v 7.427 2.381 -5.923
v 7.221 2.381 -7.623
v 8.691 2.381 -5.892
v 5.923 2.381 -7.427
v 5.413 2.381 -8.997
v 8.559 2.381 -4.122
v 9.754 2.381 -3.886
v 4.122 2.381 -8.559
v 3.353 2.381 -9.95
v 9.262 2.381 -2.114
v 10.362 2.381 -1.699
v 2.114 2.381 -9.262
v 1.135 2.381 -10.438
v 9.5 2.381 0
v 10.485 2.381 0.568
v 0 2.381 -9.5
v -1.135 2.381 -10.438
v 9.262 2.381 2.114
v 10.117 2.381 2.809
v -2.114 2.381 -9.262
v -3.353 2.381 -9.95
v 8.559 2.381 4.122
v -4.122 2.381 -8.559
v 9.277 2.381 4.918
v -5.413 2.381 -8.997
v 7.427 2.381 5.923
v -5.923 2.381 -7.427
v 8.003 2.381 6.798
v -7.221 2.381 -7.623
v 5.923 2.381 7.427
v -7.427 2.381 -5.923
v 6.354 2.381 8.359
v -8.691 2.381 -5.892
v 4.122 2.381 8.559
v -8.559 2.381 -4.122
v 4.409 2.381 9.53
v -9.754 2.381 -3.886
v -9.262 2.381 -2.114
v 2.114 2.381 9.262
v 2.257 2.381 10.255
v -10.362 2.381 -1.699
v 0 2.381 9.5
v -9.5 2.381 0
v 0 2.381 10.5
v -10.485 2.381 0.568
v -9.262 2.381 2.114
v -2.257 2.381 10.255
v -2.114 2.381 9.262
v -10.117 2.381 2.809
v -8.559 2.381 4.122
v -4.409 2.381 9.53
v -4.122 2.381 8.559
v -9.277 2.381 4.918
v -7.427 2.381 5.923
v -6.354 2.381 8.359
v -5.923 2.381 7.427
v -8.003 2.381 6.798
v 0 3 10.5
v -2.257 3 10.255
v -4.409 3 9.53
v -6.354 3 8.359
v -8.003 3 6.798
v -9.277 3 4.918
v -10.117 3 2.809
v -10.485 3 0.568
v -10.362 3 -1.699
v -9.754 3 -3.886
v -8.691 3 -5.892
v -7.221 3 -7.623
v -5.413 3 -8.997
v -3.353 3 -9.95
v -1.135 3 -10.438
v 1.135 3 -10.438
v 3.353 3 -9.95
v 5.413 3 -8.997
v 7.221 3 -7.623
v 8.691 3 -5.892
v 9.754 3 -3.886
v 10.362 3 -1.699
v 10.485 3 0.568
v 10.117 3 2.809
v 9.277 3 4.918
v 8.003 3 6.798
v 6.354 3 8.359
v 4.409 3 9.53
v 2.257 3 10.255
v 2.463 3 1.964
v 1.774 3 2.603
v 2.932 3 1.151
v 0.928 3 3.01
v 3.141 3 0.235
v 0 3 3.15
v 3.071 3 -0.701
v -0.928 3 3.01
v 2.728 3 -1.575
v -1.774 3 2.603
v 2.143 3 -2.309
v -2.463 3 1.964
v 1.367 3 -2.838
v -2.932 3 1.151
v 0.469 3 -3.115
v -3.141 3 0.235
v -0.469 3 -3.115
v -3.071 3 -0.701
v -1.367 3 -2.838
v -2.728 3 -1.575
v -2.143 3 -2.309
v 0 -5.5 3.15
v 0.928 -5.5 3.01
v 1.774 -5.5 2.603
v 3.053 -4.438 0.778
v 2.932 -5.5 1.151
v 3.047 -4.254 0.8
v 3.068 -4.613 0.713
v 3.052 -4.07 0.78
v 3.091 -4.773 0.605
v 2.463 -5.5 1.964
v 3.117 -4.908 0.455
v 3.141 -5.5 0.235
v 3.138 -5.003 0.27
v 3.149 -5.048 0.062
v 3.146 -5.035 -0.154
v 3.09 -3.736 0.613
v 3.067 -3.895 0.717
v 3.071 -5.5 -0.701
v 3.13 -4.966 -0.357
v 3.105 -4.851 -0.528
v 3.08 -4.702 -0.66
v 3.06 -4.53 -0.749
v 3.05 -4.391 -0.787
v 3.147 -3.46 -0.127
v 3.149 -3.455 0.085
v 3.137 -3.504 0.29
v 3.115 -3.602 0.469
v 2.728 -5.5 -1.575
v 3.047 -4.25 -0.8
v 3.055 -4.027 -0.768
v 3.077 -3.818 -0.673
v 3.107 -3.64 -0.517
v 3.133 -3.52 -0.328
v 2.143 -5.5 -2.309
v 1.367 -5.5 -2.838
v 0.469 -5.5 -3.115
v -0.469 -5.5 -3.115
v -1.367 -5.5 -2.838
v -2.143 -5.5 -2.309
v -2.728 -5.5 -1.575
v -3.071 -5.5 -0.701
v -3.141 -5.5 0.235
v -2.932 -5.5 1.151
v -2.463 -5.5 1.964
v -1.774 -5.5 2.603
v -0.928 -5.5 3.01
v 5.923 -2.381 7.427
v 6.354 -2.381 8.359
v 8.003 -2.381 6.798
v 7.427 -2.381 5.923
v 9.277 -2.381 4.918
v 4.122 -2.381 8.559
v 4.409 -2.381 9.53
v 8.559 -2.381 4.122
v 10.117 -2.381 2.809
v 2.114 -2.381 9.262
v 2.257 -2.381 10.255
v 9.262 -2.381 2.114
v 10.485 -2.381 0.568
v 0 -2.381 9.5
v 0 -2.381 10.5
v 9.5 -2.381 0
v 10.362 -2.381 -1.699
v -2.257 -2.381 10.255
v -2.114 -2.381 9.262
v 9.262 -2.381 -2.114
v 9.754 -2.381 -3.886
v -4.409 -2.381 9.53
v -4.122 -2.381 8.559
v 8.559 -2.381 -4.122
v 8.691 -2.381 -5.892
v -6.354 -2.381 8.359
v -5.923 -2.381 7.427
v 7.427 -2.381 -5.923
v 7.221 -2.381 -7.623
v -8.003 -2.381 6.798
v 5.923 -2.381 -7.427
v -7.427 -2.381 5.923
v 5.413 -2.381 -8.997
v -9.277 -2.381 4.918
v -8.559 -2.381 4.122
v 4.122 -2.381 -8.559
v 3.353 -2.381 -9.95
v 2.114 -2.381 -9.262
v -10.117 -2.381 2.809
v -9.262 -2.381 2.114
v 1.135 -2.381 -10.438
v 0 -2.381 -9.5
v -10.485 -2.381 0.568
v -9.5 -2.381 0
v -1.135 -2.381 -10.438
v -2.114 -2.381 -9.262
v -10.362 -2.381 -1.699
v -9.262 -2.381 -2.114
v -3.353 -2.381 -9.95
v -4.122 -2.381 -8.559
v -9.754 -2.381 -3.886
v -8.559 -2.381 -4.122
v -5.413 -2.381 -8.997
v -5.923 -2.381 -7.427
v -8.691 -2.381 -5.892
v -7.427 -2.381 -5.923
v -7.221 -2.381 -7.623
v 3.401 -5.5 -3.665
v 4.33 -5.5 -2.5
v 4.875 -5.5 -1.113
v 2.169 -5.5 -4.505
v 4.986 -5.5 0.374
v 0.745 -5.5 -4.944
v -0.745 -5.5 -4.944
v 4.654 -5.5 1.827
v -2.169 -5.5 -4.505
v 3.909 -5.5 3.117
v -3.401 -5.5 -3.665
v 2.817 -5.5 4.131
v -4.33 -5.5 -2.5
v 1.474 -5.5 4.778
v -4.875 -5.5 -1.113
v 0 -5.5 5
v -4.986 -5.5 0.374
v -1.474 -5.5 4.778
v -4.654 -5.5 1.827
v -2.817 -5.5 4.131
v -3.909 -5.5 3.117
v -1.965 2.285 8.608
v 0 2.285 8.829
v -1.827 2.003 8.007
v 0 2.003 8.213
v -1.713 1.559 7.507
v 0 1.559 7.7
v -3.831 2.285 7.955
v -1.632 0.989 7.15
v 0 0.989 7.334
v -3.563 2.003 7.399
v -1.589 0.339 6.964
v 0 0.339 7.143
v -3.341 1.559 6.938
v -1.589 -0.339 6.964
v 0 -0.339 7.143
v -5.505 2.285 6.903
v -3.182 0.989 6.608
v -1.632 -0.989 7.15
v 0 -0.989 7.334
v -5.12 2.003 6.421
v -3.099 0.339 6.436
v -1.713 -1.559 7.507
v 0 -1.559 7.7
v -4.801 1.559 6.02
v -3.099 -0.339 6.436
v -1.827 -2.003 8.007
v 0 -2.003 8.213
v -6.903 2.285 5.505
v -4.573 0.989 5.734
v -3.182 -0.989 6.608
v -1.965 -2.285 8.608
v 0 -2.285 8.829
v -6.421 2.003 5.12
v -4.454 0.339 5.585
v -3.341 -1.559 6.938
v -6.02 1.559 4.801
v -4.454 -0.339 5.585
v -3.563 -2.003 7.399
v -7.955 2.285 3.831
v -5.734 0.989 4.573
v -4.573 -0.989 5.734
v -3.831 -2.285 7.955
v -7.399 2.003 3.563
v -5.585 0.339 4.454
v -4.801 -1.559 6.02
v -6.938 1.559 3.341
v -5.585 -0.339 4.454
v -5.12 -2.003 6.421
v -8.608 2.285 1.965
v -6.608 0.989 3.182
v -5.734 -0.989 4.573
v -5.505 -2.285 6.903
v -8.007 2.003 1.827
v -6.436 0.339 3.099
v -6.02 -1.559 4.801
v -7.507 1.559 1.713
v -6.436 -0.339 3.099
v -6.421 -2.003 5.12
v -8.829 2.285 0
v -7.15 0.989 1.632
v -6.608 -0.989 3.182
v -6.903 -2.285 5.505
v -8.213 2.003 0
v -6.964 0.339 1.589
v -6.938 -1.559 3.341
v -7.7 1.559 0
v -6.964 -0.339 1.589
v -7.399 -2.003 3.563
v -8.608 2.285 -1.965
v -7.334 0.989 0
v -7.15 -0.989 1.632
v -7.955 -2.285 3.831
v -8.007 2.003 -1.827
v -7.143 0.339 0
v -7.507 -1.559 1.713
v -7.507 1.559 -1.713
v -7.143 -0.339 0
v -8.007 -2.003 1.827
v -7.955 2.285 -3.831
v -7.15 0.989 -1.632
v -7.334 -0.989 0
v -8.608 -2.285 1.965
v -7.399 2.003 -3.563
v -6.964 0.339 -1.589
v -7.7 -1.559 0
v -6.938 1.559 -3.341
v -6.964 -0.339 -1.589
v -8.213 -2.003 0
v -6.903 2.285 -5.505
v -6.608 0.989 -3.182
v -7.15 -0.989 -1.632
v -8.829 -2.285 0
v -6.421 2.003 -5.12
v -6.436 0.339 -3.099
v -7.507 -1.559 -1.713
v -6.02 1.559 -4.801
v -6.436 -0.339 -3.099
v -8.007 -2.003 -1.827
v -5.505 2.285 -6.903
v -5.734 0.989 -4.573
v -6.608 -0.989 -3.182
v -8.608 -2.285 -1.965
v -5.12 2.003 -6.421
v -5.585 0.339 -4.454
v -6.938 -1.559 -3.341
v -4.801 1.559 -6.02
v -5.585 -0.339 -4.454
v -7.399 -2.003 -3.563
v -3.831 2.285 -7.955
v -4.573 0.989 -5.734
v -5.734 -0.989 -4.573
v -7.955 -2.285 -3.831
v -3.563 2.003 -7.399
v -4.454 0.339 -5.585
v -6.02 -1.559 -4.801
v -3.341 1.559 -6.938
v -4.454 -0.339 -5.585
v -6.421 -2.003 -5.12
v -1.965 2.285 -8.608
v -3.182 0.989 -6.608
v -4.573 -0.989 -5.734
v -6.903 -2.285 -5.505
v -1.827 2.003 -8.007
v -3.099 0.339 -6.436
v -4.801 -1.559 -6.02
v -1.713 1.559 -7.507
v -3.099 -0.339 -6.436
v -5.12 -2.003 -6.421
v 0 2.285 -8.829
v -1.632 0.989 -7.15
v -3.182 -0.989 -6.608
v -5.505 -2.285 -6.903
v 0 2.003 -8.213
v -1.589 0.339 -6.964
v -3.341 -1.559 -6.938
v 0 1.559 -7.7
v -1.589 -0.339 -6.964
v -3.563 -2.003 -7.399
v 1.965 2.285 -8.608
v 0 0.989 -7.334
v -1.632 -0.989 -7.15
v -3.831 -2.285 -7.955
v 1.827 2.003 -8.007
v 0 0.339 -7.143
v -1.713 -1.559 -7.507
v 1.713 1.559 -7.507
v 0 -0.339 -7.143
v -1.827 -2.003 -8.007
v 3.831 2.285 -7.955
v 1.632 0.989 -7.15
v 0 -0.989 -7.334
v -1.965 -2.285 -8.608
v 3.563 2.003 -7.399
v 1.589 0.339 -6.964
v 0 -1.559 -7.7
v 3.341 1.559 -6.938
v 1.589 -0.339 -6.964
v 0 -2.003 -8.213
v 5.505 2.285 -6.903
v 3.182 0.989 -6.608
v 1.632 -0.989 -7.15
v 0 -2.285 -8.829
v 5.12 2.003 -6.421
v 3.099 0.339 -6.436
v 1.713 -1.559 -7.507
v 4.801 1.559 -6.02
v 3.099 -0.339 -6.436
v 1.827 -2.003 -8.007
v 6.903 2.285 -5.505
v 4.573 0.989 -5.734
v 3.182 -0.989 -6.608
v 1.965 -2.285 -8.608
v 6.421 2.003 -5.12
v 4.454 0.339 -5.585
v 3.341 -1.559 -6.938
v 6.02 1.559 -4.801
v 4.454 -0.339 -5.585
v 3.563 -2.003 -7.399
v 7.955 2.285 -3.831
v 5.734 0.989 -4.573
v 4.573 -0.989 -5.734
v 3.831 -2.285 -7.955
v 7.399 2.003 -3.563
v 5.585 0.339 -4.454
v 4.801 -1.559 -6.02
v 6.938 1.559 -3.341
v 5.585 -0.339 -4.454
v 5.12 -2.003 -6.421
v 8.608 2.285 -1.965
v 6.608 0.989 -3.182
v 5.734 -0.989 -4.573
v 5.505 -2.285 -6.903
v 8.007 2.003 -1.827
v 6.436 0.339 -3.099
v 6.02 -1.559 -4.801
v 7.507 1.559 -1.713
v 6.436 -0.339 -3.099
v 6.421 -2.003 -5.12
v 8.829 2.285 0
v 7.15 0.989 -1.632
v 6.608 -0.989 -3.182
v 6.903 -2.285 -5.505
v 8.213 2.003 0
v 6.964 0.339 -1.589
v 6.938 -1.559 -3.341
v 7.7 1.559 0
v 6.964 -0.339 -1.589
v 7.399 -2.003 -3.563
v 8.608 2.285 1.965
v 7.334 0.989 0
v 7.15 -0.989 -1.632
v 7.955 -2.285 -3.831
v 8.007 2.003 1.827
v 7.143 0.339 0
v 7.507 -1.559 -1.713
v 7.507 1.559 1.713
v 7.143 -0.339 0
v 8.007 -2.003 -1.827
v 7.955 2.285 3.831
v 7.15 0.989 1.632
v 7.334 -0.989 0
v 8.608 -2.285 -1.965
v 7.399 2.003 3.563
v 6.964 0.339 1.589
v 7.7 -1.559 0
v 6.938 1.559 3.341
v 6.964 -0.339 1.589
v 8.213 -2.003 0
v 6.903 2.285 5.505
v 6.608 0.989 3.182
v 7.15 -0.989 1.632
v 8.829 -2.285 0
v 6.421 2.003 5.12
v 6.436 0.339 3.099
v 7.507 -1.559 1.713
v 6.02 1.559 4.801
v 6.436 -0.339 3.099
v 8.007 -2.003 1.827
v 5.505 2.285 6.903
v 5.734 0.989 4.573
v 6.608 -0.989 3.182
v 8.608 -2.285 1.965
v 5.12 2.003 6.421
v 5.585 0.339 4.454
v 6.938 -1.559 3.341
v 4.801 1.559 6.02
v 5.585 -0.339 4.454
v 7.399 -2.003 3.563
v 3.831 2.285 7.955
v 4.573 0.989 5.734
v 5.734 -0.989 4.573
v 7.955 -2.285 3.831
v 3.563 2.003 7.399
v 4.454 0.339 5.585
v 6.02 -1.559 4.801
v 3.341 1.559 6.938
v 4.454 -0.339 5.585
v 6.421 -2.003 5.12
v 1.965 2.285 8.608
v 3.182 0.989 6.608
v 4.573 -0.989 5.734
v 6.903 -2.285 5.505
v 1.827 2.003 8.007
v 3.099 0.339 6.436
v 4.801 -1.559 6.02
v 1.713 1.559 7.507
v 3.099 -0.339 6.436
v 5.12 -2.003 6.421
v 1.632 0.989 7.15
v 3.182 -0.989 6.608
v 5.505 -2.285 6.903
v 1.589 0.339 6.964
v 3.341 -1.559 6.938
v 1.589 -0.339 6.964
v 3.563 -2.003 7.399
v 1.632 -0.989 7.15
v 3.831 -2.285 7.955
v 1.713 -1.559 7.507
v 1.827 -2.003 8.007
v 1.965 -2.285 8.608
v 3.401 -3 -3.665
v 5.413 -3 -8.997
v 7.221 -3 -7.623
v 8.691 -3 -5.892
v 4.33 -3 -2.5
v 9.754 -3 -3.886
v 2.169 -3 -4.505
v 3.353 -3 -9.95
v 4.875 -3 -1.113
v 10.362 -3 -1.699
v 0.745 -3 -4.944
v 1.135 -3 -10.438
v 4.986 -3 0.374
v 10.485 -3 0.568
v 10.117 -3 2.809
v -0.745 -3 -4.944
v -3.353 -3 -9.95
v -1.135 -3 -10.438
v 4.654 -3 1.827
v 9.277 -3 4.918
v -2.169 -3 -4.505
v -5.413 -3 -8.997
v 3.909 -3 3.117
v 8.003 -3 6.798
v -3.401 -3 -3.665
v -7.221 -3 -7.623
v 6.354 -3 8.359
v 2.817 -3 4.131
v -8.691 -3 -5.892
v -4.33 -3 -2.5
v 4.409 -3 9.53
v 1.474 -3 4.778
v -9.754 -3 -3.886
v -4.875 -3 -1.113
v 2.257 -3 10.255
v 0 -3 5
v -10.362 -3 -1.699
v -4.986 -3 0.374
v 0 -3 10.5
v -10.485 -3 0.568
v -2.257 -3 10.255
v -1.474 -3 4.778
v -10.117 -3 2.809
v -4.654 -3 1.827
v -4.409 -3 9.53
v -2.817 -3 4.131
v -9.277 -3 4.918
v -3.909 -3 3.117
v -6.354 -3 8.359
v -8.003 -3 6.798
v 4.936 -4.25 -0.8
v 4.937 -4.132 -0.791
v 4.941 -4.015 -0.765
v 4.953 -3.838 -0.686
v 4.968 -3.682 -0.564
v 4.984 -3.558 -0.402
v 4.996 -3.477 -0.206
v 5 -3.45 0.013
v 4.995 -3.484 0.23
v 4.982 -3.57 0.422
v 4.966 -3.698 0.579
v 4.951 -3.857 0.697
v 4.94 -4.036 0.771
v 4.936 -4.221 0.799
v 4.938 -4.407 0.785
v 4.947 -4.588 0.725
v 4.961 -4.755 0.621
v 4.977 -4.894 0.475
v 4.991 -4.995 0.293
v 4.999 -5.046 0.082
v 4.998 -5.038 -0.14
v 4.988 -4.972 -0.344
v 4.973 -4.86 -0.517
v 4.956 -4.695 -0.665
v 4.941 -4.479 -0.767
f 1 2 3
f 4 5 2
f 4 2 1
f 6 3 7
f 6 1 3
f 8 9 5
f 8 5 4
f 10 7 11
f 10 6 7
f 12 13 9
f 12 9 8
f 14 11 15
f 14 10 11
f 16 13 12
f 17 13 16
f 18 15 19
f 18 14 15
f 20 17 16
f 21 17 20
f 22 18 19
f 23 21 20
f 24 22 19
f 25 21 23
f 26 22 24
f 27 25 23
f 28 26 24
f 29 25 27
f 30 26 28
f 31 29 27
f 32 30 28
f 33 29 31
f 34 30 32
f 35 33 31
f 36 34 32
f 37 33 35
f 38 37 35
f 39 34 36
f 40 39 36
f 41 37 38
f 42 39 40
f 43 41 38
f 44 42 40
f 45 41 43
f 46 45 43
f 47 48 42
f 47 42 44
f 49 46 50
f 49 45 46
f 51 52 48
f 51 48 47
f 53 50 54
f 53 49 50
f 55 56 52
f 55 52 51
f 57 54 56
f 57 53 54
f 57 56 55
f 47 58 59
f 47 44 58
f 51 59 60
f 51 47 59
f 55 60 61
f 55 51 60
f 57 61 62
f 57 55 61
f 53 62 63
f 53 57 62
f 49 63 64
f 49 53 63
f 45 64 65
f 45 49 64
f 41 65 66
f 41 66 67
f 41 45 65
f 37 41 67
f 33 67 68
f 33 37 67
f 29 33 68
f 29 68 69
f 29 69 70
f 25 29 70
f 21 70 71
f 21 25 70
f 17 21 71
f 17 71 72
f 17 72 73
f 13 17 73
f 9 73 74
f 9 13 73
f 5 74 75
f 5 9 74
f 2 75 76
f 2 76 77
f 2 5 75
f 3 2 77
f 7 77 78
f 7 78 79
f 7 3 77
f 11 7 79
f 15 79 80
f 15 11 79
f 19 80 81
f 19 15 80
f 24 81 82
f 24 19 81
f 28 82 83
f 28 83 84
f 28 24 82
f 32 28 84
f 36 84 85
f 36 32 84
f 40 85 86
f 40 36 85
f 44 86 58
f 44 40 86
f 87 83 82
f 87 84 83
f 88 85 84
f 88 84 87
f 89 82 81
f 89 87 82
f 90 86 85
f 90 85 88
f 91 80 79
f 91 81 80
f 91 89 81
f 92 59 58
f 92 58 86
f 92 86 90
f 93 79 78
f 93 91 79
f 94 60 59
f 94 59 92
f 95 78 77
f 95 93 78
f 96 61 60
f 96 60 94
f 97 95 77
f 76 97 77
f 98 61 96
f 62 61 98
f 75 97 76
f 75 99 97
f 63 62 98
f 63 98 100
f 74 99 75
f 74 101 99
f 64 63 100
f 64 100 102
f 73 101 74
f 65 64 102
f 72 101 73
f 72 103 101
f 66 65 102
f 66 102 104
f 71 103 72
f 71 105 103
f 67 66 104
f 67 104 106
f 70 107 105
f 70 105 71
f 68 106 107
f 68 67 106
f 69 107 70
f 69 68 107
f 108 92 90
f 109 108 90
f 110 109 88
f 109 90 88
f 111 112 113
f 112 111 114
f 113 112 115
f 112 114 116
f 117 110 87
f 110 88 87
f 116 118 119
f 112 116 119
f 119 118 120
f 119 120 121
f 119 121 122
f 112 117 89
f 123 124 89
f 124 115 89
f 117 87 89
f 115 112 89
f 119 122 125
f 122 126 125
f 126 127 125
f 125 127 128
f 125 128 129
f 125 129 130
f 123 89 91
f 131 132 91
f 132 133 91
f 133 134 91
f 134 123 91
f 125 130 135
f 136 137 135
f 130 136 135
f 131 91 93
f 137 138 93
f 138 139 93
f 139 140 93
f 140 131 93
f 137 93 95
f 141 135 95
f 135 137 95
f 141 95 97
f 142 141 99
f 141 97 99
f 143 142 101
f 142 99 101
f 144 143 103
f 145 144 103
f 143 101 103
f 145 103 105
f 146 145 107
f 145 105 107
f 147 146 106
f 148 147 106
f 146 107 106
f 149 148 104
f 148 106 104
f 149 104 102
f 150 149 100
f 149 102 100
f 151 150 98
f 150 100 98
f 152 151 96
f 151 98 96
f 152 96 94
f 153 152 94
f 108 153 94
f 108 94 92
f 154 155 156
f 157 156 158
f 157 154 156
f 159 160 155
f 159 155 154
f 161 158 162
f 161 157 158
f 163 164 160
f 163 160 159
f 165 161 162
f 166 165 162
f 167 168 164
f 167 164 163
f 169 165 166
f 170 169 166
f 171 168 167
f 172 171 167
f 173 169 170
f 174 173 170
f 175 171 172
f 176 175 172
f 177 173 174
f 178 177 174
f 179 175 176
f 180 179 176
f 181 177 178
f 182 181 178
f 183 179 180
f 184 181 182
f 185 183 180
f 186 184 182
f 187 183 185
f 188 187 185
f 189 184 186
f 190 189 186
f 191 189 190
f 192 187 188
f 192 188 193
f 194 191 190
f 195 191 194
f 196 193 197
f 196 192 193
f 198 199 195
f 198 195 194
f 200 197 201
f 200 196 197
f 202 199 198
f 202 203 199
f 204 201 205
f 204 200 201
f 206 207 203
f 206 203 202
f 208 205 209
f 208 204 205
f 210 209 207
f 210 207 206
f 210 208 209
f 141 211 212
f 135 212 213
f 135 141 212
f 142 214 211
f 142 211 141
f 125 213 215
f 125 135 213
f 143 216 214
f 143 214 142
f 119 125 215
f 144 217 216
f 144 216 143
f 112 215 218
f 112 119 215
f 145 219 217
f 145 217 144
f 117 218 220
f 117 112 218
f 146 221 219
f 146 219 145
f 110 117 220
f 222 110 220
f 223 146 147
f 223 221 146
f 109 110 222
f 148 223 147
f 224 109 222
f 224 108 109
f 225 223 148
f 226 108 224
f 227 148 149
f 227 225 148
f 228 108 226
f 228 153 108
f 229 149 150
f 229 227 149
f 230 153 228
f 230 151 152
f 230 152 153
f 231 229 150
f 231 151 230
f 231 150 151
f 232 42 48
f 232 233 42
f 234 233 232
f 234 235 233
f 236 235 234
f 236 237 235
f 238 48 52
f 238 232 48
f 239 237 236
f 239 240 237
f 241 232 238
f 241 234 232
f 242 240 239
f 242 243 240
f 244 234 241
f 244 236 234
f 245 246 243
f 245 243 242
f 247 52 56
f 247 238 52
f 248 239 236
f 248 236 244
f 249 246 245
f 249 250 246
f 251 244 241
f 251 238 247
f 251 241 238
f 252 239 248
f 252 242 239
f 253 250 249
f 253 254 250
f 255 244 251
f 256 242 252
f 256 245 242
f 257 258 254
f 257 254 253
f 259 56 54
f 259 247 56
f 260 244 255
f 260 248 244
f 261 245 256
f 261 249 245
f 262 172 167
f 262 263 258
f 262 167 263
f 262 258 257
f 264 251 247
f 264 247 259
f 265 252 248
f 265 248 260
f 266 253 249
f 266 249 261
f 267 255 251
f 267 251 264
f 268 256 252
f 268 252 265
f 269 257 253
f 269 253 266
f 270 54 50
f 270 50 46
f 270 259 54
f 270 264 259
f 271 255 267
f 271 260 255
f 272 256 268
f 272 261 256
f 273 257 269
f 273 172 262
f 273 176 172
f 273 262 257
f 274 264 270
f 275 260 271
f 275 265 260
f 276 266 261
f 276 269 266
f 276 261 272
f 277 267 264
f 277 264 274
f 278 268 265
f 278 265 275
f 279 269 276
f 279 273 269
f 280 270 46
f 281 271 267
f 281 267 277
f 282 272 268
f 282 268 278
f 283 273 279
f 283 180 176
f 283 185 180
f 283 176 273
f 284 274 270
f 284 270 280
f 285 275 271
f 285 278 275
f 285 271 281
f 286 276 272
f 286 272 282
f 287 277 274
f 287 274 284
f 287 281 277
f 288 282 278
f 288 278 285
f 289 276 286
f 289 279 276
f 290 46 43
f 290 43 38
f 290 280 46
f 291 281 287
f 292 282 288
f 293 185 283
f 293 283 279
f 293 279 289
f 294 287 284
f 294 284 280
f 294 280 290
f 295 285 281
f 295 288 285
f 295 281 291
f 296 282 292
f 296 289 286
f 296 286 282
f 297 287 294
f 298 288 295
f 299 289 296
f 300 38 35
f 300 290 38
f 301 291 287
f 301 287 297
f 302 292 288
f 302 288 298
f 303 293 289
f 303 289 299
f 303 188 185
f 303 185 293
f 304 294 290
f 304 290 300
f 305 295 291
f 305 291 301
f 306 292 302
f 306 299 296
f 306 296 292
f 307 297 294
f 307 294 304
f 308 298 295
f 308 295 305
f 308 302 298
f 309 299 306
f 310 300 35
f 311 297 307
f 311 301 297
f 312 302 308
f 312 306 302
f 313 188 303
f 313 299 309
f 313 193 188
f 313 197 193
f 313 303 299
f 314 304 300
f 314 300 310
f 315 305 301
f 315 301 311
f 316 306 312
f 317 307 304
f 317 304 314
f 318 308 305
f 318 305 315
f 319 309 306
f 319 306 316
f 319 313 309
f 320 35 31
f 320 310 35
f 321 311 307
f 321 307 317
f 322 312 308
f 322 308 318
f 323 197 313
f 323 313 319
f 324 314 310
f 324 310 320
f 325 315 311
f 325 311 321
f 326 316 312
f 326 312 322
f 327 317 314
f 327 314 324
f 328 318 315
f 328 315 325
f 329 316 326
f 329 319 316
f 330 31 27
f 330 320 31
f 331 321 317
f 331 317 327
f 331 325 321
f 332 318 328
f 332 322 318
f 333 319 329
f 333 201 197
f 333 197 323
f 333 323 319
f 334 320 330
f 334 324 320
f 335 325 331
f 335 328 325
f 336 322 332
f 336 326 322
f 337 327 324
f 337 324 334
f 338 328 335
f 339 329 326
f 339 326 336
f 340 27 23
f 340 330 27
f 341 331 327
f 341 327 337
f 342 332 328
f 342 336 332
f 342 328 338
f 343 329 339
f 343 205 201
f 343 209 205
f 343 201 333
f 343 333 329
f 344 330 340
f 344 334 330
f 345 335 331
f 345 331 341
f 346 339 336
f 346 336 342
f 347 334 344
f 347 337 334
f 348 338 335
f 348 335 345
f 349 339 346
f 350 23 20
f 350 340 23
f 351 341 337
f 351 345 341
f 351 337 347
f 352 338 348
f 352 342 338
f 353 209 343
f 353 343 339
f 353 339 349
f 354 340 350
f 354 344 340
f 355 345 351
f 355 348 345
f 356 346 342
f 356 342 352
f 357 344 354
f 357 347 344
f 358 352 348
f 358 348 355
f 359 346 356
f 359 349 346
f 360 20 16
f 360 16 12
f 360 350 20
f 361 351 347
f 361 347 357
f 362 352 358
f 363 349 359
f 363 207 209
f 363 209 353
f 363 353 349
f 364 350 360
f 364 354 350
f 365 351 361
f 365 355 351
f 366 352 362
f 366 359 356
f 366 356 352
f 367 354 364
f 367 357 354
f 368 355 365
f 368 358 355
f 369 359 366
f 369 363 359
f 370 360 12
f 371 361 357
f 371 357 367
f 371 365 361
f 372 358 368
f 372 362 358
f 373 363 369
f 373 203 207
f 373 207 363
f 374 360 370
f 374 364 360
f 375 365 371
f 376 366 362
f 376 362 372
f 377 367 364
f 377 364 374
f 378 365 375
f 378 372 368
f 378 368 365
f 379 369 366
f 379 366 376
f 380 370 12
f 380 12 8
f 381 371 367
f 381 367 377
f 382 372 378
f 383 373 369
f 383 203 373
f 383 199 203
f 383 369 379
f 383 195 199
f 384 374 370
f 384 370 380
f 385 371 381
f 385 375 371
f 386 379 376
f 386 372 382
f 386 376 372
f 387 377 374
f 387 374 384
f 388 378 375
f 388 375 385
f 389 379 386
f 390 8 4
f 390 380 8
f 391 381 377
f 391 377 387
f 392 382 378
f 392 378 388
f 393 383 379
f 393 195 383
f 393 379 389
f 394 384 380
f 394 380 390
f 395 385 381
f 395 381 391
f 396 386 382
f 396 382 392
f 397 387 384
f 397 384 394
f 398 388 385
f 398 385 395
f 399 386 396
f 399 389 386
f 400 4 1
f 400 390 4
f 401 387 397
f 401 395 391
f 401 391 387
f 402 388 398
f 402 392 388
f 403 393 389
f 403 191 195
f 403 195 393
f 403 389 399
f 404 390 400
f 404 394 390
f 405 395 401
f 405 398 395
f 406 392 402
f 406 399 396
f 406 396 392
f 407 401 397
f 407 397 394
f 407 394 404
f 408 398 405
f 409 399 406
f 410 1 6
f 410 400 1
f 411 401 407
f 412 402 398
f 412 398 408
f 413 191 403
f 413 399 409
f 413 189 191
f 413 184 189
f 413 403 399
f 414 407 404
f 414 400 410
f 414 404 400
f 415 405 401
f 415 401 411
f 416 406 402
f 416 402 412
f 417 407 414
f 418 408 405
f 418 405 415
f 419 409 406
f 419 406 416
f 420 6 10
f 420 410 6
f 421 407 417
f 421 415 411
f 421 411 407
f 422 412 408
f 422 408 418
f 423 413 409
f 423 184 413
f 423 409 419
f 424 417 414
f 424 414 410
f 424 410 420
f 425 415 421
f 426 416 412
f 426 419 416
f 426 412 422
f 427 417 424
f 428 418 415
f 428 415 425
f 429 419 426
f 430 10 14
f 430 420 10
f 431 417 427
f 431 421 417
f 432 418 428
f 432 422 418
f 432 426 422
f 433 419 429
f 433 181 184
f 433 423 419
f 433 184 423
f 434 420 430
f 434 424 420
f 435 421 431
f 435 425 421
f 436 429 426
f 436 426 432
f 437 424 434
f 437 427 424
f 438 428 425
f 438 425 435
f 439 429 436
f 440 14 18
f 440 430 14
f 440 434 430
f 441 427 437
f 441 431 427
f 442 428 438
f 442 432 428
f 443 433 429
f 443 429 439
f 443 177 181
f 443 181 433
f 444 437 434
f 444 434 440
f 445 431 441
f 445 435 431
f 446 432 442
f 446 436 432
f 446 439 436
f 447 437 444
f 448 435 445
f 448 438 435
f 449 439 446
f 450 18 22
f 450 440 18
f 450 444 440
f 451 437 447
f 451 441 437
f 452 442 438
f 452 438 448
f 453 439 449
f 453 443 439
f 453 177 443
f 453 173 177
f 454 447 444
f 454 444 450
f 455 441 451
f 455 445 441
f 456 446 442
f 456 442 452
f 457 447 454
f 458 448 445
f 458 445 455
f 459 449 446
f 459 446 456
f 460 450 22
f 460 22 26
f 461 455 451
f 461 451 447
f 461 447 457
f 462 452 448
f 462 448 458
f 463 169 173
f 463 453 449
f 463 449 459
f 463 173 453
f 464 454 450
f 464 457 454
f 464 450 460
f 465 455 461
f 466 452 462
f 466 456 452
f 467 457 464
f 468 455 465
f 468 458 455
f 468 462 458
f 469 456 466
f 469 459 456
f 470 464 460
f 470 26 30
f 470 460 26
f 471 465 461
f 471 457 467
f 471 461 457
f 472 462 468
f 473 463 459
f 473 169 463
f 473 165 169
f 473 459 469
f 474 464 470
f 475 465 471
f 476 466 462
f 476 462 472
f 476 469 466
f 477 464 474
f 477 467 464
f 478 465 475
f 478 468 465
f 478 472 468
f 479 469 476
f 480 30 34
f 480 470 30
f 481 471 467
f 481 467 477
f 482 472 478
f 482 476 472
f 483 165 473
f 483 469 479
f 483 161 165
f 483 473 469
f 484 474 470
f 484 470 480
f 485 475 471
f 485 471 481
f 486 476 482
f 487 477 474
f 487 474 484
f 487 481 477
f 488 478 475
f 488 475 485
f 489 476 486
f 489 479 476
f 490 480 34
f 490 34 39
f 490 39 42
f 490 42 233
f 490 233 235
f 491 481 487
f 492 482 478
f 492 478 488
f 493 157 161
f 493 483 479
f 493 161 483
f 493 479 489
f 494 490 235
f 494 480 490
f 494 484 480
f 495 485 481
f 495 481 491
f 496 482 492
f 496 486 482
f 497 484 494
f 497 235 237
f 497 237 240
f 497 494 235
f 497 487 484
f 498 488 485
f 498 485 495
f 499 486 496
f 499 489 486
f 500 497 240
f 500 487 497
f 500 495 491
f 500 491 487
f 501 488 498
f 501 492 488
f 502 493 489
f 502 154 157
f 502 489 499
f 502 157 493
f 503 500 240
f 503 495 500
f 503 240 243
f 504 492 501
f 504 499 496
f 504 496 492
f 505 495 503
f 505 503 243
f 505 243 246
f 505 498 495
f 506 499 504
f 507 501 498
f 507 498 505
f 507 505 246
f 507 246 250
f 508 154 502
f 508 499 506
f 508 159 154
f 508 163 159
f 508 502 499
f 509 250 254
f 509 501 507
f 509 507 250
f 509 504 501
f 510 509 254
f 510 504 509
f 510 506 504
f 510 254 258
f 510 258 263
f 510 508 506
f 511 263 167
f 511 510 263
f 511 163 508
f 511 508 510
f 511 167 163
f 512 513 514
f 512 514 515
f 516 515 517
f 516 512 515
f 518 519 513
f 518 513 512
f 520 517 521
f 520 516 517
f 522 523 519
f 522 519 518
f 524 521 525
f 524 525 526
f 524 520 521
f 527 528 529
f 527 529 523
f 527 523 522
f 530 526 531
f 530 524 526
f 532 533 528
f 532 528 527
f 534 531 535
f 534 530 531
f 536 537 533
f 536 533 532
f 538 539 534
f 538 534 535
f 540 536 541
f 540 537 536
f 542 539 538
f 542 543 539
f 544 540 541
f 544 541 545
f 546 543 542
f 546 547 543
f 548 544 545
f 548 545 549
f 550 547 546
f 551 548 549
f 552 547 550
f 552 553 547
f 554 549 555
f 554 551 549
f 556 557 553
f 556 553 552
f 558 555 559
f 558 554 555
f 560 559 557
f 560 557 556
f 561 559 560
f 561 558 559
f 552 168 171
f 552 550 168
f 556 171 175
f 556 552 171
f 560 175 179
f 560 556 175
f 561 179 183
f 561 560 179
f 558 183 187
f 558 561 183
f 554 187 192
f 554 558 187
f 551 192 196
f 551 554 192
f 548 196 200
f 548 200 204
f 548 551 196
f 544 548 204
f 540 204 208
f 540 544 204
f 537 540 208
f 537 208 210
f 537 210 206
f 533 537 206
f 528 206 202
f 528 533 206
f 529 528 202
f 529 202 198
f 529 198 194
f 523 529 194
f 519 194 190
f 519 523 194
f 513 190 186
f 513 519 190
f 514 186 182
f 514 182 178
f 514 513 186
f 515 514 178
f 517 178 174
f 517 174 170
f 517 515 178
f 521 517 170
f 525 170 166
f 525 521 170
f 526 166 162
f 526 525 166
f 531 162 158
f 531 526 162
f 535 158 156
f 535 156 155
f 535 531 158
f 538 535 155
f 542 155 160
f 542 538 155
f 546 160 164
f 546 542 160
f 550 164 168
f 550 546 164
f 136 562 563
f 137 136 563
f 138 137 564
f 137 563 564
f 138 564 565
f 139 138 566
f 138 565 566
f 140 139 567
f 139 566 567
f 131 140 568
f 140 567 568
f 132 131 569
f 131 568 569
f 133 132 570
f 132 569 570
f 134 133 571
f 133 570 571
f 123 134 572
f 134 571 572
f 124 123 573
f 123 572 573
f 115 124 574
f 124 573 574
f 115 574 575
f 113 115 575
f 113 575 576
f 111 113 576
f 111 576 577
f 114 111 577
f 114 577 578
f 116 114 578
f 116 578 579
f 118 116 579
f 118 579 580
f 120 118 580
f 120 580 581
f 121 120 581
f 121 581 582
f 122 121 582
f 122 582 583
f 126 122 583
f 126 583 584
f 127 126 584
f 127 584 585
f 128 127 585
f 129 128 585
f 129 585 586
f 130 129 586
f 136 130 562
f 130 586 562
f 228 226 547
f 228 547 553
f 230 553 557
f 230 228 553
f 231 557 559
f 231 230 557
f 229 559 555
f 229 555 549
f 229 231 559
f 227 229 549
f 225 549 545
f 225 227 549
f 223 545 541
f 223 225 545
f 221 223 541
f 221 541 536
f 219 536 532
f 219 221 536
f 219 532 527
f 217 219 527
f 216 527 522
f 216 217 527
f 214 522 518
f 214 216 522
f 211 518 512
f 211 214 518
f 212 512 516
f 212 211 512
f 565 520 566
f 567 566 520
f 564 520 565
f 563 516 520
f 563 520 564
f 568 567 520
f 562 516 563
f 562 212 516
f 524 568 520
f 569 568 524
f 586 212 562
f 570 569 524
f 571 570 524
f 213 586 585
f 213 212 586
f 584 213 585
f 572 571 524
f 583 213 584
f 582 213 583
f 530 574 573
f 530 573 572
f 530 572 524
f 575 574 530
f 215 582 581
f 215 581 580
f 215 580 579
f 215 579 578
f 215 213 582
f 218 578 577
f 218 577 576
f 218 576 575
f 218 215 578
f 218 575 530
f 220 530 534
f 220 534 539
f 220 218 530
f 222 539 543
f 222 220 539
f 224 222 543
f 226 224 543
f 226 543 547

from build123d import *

# Parameters (mm, degrees)
SKETCH2_R                  = 3.15
CUT_EXTRUDE1_DEPTH         = 18.109938632
M2X0_4_TAPPED_HOLE2_REACH  = 21.513
M2X0_4_TAPPED_HOLE2_BORE_R = 0.8


with BuildPart() as part:
    # Sketch1 → Revolve1 (revolve)
    with BuildSketch(Plane.XY, mode=Mode.PRIVATE) as revolve1_sk:
        with BuildLine():
            Line((-10.5, -3), (-5, -3))
            Line((-5, -3), (-5, -5.5))
            Line((-5, -5.5), (0, -5.5))
            Line((0, -5.5), (0, 3))
            Line((0, 3), (-10.5, 3))
            Line((-10.5, 3), (-10.5, 2.38125))
            Line((-10.5, 2.38125), (-9.5, 2.38125))
            ThreePointArc((-9.5, 2.38125), (-7.11875, 0), (-9.5, -2.38125))
            Line((-9.5, -2.38125), (-10.5, -2.38125))
            Line((-10.5, -2.38125), (-10.5, -3))
        make_face()
    revolve(revolve1_sk.sketch.rotate(Axis((0, 5.888182105, 0), (0, -1, 0)), 270), axis=Axis((0, 5.888182105, 0), (0, -1, 0)))

    # Sketch2 → Cut-Extrude1 (cut, through all)
    with BuildSketch(Plane(origin=(0, 3, 0), x_dir=(1, 0, 0), z_dir=(0, 1, 0))):
        with Locations(Location((0, 0, 0), (0, 0, 270))):
            Circle(SKETCH2_R)
    extrude(amount=-CUT_EXTRUDE1_DEPTH, mode=Mode.SUBTRACT)

    # M2x0.4 Tapped Hole2 bore → M2x0.4 Tapped Hole2 (cut, up to next)
    with BuildSketch(Plane(origin=(5, 0, 0), x_dir=(0, 0, -1), z_dir=(1, 0, 0)), mode=Mode.PRIVATE) as m2x0_4_tapped_hole2_sk1:
        with Locations((0, -4.25)):
            Circle(M2X0_4_TAPPED_HOLE2_BORE_R)
    m2x0_4_tapped_hole2_tool1 = extrude(m2x0_4_tapped_hole2_sk1.sketch, amount=-M2X0_4_TAPPED_HOLE2_REACH, mode=Mode.PRIVATE) & part.part
    add(m2x0_4_tapped_hole2_tool1.solids().sort_by_distance((5, -4.25, 0))[0], mode=Mode.SUBTRACT)


solid = part.part
